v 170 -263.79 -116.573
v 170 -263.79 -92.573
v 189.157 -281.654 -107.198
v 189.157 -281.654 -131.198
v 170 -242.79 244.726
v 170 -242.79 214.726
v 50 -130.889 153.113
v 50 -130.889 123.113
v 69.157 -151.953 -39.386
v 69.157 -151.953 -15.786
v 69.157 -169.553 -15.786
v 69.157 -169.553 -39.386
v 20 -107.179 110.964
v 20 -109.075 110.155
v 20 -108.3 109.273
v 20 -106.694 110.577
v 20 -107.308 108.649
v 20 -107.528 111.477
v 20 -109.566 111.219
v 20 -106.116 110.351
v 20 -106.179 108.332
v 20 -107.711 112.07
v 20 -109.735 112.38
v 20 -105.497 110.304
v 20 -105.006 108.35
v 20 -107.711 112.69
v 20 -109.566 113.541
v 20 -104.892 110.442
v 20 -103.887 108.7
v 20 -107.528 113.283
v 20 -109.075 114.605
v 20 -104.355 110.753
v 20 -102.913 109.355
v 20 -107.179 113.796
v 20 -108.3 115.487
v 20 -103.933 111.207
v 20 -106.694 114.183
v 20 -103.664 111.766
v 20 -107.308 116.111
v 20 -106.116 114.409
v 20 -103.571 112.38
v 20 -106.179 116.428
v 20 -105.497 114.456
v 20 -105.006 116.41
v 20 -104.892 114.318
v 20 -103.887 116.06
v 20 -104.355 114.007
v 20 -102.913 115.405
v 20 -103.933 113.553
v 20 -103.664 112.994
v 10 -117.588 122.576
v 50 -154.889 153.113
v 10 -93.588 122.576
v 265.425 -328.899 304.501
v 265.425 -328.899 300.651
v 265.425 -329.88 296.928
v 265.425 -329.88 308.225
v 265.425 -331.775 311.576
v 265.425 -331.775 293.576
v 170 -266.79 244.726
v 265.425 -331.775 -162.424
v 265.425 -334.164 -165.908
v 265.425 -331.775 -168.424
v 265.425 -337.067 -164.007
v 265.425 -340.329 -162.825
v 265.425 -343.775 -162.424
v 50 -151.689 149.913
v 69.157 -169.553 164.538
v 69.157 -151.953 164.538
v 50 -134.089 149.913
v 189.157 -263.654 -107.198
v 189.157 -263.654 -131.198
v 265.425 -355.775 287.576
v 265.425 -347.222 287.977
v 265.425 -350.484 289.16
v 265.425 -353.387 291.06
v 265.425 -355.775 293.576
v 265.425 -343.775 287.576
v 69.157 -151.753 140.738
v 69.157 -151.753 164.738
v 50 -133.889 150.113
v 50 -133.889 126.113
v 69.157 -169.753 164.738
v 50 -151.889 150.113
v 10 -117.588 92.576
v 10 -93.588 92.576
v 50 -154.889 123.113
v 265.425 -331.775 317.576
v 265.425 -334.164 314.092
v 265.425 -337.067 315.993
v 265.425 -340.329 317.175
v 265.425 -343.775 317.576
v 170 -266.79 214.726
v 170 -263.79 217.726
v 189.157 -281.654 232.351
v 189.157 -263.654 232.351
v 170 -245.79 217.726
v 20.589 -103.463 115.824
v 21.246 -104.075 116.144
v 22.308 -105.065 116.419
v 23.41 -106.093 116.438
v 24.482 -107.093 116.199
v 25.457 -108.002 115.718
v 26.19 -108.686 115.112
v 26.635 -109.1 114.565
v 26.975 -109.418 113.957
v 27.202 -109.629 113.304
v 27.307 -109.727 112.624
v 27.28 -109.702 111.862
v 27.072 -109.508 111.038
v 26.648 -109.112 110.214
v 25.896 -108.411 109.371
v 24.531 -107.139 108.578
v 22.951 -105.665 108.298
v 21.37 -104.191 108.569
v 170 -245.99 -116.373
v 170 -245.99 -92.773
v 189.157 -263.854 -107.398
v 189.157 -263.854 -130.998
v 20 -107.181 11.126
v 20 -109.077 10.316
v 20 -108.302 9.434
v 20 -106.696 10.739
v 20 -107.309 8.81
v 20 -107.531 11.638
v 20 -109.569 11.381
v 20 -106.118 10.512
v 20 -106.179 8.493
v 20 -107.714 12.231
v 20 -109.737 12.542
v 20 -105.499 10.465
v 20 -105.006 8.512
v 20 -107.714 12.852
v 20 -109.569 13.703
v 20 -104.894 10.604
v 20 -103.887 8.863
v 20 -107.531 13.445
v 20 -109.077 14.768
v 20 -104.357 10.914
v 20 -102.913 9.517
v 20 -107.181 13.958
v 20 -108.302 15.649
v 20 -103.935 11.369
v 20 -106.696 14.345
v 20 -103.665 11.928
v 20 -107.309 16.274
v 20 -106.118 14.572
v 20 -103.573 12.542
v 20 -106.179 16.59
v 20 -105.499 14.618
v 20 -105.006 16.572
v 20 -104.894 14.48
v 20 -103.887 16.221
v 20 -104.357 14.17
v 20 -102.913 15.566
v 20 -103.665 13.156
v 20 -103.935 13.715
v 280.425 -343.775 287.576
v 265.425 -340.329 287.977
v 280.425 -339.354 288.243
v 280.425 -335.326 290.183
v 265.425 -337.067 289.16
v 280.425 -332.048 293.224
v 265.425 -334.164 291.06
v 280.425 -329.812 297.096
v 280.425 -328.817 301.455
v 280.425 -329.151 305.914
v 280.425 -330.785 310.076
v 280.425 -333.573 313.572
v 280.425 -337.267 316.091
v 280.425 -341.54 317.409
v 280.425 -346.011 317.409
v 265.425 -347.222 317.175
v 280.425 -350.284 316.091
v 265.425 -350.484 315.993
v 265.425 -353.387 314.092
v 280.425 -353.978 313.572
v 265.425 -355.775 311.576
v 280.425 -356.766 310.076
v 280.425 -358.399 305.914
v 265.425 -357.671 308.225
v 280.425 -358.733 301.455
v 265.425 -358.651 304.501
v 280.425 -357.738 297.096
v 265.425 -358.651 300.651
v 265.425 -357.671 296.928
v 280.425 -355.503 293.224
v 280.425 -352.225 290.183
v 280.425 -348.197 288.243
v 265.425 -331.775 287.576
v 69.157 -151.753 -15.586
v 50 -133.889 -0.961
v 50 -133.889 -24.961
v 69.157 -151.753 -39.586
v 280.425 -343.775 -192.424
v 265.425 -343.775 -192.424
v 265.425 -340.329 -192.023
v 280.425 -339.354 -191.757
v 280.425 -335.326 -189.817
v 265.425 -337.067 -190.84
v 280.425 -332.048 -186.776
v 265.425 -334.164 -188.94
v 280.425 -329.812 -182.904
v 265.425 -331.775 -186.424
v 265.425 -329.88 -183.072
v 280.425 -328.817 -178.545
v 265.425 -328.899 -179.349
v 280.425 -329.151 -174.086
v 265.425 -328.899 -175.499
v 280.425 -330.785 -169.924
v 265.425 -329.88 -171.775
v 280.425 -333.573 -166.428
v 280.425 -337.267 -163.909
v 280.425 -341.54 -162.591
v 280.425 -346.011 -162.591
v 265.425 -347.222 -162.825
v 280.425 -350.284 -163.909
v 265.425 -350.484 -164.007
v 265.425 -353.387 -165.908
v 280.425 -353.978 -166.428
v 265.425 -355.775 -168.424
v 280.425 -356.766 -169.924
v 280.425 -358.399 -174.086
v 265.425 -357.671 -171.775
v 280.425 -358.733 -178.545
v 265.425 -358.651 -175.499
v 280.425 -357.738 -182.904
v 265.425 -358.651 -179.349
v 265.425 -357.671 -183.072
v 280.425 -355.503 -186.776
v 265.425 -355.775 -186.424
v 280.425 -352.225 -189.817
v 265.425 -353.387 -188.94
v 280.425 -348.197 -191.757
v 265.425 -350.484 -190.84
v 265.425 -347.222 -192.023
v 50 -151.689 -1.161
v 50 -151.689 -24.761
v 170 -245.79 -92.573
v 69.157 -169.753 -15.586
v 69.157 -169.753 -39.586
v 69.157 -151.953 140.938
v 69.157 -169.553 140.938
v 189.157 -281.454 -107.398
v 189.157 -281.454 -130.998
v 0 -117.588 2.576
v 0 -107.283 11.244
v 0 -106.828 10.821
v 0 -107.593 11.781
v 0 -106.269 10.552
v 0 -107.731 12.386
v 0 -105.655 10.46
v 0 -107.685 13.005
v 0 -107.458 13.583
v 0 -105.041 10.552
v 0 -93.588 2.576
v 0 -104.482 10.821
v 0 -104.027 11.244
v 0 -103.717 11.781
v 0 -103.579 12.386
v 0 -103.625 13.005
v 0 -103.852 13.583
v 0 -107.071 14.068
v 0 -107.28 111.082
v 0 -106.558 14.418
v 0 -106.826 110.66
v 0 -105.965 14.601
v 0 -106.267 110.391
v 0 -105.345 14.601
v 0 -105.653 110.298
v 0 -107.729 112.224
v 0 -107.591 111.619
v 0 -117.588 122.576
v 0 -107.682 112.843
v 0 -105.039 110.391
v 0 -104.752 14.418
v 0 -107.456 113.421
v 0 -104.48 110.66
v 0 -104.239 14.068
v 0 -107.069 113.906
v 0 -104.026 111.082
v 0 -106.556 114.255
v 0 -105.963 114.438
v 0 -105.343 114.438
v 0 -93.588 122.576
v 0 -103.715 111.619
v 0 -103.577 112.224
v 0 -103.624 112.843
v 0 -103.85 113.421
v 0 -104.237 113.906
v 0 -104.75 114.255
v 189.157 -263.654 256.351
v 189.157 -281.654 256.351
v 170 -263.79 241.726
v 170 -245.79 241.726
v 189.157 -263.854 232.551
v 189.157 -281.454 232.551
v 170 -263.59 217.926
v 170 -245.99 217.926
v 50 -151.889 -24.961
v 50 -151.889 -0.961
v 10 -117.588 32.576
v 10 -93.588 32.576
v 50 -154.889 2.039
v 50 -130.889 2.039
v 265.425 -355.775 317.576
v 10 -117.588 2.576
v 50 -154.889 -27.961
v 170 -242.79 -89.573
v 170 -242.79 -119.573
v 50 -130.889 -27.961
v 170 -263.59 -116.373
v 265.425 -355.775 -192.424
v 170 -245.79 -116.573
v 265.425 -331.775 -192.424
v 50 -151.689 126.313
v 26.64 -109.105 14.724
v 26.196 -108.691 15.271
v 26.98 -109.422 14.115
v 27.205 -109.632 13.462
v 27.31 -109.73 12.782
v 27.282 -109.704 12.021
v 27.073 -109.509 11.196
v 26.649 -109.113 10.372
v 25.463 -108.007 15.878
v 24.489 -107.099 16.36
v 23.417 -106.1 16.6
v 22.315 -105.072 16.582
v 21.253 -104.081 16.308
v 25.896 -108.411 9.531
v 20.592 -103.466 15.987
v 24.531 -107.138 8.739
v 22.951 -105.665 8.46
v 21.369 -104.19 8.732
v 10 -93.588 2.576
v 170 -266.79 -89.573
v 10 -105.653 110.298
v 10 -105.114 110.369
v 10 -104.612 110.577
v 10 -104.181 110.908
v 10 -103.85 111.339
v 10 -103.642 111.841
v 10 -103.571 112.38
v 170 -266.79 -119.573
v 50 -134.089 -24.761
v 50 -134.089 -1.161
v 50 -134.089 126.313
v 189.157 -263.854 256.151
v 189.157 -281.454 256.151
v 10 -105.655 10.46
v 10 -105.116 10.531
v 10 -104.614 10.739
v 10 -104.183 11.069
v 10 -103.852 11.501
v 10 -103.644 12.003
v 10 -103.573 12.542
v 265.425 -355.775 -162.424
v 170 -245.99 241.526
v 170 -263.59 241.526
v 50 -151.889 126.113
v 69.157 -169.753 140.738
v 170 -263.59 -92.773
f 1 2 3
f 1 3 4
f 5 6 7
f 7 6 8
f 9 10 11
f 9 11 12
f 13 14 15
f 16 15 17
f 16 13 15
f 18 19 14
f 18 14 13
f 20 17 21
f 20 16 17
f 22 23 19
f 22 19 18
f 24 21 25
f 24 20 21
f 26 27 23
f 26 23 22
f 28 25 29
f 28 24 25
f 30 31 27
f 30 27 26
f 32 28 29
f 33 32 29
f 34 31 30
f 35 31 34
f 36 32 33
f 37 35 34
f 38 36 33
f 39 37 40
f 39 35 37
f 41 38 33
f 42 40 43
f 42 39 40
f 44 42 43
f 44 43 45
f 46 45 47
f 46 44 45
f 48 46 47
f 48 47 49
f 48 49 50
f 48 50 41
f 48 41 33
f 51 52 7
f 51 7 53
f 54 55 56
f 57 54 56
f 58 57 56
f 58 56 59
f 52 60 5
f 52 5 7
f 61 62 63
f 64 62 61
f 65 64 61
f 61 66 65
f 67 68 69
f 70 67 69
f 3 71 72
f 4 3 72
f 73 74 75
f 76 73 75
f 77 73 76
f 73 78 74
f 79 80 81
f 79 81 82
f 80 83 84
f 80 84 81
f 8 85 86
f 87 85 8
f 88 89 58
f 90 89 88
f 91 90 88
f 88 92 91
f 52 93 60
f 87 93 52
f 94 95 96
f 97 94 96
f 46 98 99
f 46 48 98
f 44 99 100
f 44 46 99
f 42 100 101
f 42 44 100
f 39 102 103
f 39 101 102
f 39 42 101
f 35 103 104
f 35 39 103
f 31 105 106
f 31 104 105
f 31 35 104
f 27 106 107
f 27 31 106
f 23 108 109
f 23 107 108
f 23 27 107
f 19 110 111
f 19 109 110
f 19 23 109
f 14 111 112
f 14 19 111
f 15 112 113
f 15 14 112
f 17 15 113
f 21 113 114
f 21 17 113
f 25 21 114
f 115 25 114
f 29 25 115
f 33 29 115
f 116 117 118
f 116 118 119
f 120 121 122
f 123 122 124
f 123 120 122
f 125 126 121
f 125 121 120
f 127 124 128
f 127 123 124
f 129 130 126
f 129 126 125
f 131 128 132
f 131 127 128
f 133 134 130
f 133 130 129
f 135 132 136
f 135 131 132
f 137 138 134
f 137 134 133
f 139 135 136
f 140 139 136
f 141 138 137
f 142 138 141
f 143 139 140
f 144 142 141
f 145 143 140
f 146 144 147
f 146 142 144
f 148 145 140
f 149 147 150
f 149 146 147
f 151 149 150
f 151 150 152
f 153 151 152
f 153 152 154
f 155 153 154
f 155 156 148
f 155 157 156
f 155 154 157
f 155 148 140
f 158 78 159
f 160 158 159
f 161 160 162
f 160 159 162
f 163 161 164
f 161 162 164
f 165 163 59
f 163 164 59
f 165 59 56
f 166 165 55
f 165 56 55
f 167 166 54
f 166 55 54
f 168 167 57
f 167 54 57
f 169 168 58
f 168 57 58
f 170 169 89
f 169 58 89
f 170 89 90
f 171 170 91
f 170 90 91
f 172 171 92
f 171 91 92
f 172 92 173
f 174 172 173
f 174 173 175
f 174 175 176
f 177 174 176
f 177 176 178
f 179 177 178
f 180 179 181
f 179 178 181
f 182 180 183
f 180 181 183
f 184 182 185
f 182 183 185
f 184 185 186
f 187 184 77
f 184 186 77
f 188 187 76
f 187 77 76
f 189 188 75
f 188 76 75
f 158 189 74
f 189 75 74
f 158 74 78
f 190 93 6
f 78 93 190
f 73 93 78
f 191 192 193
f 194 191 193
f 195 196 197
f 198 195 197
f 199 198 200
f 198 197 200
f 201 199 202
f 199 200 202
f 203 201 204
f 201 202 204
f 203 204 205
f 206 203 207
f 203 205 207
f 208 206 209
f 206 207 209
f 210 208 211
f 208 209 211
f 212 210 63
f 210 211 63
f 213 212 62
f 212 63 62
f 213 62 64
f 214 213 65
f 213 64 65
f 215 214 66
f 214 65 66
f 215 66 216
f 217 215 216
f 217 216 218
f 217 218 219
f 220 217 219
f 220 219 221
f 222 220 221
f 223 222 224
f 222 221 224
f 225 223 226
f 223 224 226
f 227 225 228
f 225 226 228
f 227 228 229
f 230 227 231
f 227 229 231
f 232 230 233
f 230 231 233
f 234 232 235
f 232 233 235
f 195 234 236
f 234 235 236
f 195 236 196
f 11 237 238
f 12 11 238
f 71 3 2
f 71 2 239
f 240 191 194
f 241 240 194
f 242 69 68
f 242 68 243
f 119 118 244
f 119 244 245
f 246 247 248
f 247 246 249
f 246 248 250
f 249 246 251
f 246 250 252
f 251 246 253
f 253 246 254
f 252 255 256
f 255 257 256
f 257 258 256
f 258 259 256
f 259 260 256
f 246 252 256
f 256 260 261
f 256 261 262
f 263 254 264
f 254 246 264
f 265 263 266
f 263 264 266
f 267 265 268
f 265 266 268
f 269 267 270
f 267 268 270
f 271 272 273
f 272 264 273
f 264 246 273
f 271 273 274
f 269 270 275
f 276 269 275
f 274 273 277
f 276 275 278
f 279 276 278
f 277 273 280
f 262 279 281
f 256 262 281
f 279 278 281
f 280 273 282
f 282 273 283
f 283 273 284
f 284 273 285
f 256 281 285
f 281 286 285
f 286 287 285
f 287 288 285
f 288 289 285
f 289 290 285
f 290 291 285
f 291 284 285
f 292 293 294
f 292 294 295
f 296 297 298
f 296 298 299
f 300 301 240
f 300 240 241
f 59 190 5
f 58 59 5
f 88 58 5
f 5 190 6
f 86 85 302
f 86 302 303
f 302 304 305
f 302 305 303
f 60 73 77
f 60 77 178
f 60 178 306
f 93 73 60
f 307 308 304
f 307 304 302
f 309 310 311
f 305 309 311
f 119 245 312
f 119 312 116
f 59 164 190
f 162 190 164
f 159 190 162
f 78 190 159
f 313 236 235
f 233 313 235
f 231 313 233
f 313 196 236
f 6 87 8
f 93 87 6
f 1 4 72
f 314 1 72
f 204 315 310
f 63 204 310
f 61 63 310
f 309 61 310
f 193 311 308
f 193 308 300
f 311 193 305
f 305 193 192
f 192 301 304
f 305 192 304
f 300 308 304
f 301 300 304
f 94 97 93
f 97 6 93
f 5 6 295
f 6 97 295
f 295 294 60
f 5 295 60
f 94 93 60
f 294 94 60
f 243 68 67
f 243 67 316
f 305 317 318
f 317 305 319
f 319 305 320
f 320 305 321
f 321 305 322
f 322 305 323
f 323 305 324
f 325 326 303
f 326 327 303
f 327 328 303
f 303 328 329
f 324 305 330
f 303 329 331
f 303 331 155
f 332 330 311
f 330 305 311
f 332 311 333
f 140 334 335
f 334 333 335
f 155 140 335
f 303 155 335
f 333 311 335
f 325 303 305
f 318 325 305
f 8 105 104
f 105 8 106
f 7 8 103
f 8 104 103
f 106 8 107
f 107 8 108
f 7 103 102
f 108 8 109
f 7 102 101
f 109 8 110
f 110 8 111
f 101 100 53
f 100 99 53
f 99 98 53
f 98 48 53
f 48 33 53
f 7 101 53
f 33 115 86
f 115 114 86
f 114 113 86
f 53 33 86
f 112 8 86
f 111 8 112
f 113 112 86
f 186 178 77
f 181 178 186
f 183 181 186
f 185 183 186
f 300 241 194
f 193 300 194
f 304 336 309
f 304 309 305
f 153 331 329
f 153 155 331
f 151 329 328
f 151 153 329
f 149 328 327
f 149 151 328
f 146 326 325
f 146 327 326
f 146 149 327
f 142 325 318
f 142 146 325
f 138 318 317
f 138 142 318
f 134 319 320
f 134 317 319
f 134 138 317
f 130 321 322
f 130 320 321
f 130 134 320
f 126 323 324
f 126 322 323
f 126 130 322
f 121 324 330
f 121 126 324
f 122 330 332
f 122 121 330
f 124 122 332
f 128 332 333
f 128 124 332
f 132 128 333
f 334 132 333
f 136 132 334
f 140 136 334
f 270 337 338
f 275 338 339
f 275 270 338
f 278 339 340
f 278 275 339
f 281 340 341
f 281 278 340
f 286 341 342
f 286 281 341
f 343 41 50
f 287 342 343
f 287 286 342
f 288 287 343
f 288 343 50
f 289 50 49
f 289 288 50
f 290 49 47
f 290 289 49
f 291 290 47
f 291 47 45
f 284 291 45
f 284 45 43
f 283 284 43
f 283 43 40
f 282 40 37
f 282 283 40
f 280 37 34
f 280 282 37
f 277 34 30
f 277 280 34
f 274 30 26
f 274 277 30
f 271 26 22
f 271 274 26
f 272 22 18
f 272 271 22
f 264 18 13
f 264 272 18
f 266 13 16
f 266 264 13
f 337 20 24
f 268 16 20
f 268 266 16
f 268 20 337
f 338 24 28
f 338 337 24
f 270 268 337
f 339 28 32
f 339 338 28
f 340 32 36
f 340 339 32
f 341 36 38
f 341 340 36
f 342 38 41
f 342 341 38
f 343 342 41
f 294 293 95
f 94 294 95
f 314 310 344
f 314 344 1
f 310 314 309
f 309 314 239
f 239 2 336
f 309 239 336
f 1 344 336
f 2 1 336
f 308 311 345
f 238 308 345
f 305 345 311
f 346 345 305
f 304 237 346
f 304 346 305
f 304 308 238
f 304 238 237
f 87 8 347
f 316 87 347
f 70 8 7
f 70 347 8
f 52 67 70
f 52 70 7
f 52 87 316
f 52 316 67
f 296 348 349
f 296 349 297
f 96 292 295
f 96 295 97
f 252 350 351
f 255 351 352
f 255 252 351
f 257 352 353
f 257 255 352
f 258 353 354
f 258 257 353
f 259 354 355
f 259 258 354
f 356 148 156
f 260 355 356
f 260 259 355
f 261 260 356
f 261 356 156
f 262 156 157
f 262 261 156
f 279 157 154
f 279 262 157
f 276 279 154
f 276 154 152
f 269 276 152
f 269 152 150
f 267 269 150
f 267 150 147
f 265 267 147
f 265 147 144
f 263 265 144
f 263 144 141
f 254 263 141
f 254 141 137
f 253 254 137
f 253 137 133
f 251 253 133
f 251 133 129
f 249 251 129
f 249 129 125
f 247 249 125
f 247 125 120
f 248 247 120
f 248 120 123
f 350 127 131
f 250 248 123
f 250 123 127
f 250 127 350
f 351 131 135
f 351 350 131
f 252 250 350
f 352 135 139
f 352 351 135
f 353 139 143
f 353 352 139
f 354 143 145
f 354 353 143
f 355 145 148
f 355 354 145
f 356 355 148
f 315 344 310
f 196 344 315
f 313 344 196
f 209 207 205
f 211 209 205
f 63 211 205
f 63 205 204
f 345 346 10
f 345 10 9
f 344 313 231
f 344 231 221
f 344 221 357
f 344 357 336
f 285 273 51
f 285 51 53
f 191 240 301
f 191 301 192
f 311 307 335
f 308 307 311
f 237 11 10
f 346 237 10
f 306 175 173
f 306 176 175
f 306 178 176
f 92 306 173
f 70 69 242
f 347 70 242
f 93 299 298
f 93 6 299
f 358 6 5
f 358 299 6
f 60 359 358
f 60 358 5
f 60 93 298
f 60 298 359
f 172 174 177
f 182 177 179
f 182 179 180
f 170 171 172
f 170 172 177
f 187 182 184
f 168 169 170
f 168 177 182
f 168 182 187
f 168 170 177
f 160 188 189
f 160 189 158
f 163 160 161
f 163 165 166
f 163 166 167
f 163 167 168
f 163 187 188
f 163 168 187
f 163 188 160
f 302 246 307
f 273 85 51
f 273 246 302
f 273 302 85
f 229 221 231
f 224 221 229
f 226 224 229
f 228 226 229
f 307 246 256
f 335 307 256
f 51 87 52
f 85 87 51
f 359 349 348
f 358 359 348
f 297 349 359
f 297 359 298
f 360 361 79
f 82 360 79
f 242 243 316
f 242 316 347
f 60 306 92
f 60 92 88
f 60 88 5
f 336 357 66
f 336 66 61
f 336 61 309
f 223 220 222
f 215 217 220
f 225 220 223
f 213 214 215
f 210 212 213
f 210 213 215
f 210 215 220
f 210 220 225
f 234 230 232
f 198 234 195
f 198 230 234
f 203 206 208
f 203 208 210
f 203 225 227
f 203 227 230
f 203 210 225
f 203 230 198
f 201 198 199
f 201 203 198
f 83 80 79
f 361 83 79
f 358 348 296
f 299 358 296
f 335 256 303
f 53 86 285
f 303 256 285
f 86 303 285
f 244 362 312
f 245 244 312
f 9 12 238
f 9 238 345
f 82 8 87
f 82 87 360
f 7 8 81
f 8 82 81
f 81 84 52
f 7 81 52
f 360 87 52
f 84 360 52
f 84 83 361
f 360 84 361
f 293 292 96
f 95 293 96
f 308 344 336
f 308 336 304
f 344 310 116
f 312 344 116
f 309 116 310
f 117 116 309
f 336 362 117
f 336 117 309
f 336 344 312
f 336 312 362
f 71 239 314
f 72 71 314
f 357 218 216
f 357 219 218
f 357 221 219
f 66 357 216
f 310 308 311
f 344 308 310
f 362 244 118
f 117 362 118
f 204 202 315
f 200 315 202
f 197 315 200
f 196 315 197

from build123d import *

# Parameters (mm, degrees)
SKETCH2_W           = 24
SKETCH2_H           = 119.99962
SKETCH2_R           = 2.081646704
SKETCH2_R_2         = 2.082179954
BOSS_EXTRUDE1_DEPTH = 10
BOSS_EXTRUDE2_DEPTH = 24.00000022
SKETCH8_R           = 15
BOSS_EXTRUDE3_DEPTH = 15
SKETCH9_R           = 2.082179954
SKETCH9_R_2         = 2.081646704
CUT_EXTRUDE1_DEPTH  = 551.185267113
CUT_EXTRUDE2_START  = 10
SKETCH10_R          = 4.082179954
SKETCH10_R_2        = 4.081646704
CUT_EXTRUDE2_DEPTH  = 541.185267113
SKETCH11_W          = 24
SKETCH11_H          = 18
CUT_EXTRUDE3_DEPTH  = 30
SKETCH12_W          = 24
SKETCH12_H          = 18
CUT_EXTRUDE4_DEPTH  = 30
SKETCH13_W          = 24
SKETCH13_H          = 18
CUT_EXTRUDE5_DEPTH  = 30
SKETCH14_W          = 24
SKETCH14_H          = 18
CUT_EXTRUDE6_DEPTH  = 30
SKETCH15_W          = 23.6
SKETCH15_H          = 17.6
BOSS_EXTRUDE4_DEPTH = 30
SKETCH16_W          = 23.6
SKETCH16_H          = 17.6
BOSS_EXTRUDE5_DEPTH = 30
SKETCH17_W          = 23.6
SKETCH17_H          = 17.6
BOSS_EXTRUDE6_DEPTH = 30
SKETCH18_W          = 23.6
SKETCH18_H          = 17.6
BOSS_EXTRUDE7_DEPTH = 30


with BuildPart() as part:
    # Sketch2 → Boss-Extrude1 (new body)
    with BuildSketch(Plane.YZ):
        with Locations((-105.588, 62.57619)):
            Rectangle(SKETCH2_W, SKETCH2_H)
        with Locations(Location((-105.653, 112.38, 0), (0, 0, 270))):
            Circle(SKETCH2_R, mode=Mode.SUBTRACT)
        with Locations(Location((-105.655, 12.5418, 0), (0, 0, 270))):
            Circle(SKETCH2_R_2, mode=Mode.SUBTRACT)
    extrude(amount=BOSS_EXTRUDE1_DEPTH)

    # Sketch7 → Boss-Extrude2 (add, along a direction that is not the sketch's normal)
    with BuildSketch(Plane(origin=(-53.99956314, -57.907441866, 0), x_dir=(-0.7313537016191692, 0.6819983600625, 0), z_dir=(-0.6819983600625, -0.7313537016191692, 0))):
        Polygon((-87.508360179, -2.57638), (-436.757448796, 192.42381), (-436.757448796, 162.42381), (-87.508360179, -32.57638), align=None)
        Polygon((-436.757448796, -287.57619), (-436.757448796, -317.57619), (-87.508360179, -122.576), (-87.508360179, -92.576), align=None)
    extrude(amount=-BOSS_EXTRUDE2_DEPTH, dir=(0, -1, 0))

    # Sketch8 → Boss-Extrude3 (add)
    with BuildSketch(Plane.YZ.offset(265.424613747)):
        with Locations(Location((-343.77530569, 302.57619, 0), (0, 0, 270))):
            Circle(SKETCH8_R)
        with Locations(Location((-343.77530569, -177.42381, 0), (0, 0, 270))):
            Circle(SKETCH8_R)
    extrude(amount=BOSS_EXTRUDE3_DEPTH)

    # Sketch9 → Cut-Extrude1 (cut, through all)
    with BuildSketch(Plane.YZ.offset(10)):
        with Locations((-105.655, 12.5418)):
            Circle(SKETCH9_R)
        with Locations((-105.653, 112.38)):
            Circle(SKETCH9_R_2)
    extrude(amount=CUT_EXTRUDE1_DEPTH, mode=Mode.SUBTRACT)

    # Sketch10 → Cut-Extrude2 (cut, through all)
    with BuildSketch(Plane.YZ.offset(10).offset(CUT_EXTRUDE2_START)):
        with Locations((-105.655, 12.5418)):
            Circle(SKETCH10_R)
        with Locations((-105.653, 112.38)):
            Circle(SKETCH10_R_2)
    extrude(amount=CUT_EXTRUDE2_DEPTH, mode=Mode.SUBTRACT)


with BuildPart() as body_2:
    # Split1: the piece on the far side of the plane
    add(part.part)
    split(bisect_by=Plane(origin=(50, 0, 0), x_dir=(0, 0, 1), z_dir=(1, 0, 0)), keep=Keep.BOTTOM)


with BuildPart() as part_1:
    add(part.part)

    # Split1
    split(bisect_by=Plane(origin=(50, 0, 0), x_dir=(0, 0, 1), z_dir=(1, 0, 0)), keep=Keep.TOP)


with BuildPart() as body_3:
    # Split2: the piece on the far side of the plane
    add(part_1.part)
    split(bisect_by=Plane(origin=(170, 0, 0), x_dir=(0, 0, 1), z_dir=(1, 0, 0)), keep=Keep.BOTTOM)

    # Sketch11 → Cut-Extrude3 (cut, along a direction that is not the sketch's normal)
    with BuildSketch(Plane(origin=(50, 0, 0), x_dir=(0, 0, -1), z_dir=(1, 0, 0))):
        with Locations((-138.113415661, -142.888603446)):
            Rectangle(SKETCH11_W, SKETCH11_H)
    extrude(amount=CUT_EXTRUDE3_DEPTH, dir=(0.6385615343683262, -0.5954682642256793, 0.48750047500000016), mode=Mode.SUBTRACT)

    # Sketch12 → Cut-Extrude4 (cut, along a direction that is not the sketch's normal)
    with BuildSketch(Plane(origin=(50, 0, 0), x_dir=(0, 0, -1), z_dir=(1, 0, 0))):
        with Locations((12.961035661, -142.888603446)):
            Rectangle(SKETCH12_W, SKETCH12_H)
    extrude(amount=CUT_EXTRUDE4_DEPTH, dir=(0.6385615343683262, -0.5954682642256797, -0.4875004749999997), mode=Mode.SUBTRACT)


with BuildPart() as part_2:
    add(part_1.part)

    # Split2
    split(bisect_by=Plane(origin=(170, 0, 0), x_dir=(0, 0, 1), z_dir=(1, 0, 0)), keep=Keep.TOP)

    # Sketch13 → Cut-Extrude5 (cut, along a direction that is not the sketch's normal)
    with BuildSketch(Plane(origin=(170, 0, 0), x_dir=(0, 0, -1), z_dir=(1, 0, 0))):
        with Locations((-229.725662643, -254.790413782)):
            Rectangle(SKETCH13_W, SKETCH13_H)
    extrude(amount=CUT_EXTRUDE5_DEPTH, dir=(0.6385615343683262, -0.5954682642256793, 0.48750047500000016), mode=Mode.SUBTRACT)

    # Sketch14 → Cut-Extrude6 (cut, along a direction that is not the sketch's normal)
    with BuildSketch(Plane(origin=(170, 0, 0), x_dir=(0, 0, -1), z_dir=(1, 0, 0))):
        with Locations((104.573282643, -254.790413782)):
            Rectangle(SKETCH14_W, SKETCH14_H)
    extrude(amount=CUT_EXTRUDE6_DEPTH, dir=(0.6385615343683262, -0.5954682642256797, -0.4875004749999997), mode=Mode.SUBTRACT)


with BuildPart() as body_4:
    # Sketch15 → Boss-Extrude4 (new, along a direction that is not the sketch's normal)
    with BuildSketch(Plane(origin=(50, 0, 0), x_dir=(0, 0, -1), z_dir=(1, 0, 0))):
        with Locations((-138.113415661, -142.888603446)):
            Rectangle(SKETCH15_W, SKETCH15_H)
    extrude(amount=BOSS_EXTRUDE4_DEPTH, dir=(0.6385615343683262, -0.5954682642256793, 0.48750047500000016))


with BuildPart() as body_5:
    # Sketch16 → Boss-Extrude5 (new, along a direction that is not the sketch's normal)
    with BuildSketch(Plane(origin=(50, 0, 0), x_dir=(0, 0, -1), z_dir=(1, 0, 0))):
        with Locations((12.961035661, -142.888603446)):
            Rectangle(SKETCH16_W, SKETCH16_H)
    extrude(amount=BOSS_EXTRUDE5_DEPTH, dir=(0.6385615343683262, -0.5954682642256797, -0.4875004749999997))


with BuildPart() as body_2_1:
    add(body_2.part)

    # Combine1: union body 5, body 4
    add(body_5.part)
    add(body_4.part)


with BuildPart() as body_4_2:
    # Sketch17 → Boss-Extrude6 (new, along a direction that is not the sketch's normal)
    with BuildSketch(Plane(origin=(170, 0, 0), x_dir=(0, 0, -1), z_dir=(1, 0, 0))):
        with Locations((-229.725662643, -254.790413782)):
            Rectangle(SKETCH17_W, SKETCH17_H)
    extrude(amount=BOSS_EXTRUDE6_DEPTH, dir=(0.6385615343683262, -0.5954682642256793, 0.48750047500000016))

    # Combine2: union body 3
    add(body_3.part)


with BuildPart() as body_5_2:
    # Sketch18 → Boss-Extrude7 (new, along a direction that is not the sketch's normal)
    with BuildSketch(Plane(origin=(170, 0, 0), x_dir=(0, 0, -1), z_dir=(1, 0, 0))):
        with Locations((104.573282643, -254.790413782)):
            Rectangle(SKETCH18_W, SKETCH18_H)
    extrude(amount=BOSS_EXTRUDE7_DEPTH, dir=(0.6385615343683262, -0.5954682642256797, -0.4875004749999997))

    # Combine3: union body 4 2
    add(body_4_2.part)


solid = Compound([part_2.part, body_2_1.part, body_5_2.part])
